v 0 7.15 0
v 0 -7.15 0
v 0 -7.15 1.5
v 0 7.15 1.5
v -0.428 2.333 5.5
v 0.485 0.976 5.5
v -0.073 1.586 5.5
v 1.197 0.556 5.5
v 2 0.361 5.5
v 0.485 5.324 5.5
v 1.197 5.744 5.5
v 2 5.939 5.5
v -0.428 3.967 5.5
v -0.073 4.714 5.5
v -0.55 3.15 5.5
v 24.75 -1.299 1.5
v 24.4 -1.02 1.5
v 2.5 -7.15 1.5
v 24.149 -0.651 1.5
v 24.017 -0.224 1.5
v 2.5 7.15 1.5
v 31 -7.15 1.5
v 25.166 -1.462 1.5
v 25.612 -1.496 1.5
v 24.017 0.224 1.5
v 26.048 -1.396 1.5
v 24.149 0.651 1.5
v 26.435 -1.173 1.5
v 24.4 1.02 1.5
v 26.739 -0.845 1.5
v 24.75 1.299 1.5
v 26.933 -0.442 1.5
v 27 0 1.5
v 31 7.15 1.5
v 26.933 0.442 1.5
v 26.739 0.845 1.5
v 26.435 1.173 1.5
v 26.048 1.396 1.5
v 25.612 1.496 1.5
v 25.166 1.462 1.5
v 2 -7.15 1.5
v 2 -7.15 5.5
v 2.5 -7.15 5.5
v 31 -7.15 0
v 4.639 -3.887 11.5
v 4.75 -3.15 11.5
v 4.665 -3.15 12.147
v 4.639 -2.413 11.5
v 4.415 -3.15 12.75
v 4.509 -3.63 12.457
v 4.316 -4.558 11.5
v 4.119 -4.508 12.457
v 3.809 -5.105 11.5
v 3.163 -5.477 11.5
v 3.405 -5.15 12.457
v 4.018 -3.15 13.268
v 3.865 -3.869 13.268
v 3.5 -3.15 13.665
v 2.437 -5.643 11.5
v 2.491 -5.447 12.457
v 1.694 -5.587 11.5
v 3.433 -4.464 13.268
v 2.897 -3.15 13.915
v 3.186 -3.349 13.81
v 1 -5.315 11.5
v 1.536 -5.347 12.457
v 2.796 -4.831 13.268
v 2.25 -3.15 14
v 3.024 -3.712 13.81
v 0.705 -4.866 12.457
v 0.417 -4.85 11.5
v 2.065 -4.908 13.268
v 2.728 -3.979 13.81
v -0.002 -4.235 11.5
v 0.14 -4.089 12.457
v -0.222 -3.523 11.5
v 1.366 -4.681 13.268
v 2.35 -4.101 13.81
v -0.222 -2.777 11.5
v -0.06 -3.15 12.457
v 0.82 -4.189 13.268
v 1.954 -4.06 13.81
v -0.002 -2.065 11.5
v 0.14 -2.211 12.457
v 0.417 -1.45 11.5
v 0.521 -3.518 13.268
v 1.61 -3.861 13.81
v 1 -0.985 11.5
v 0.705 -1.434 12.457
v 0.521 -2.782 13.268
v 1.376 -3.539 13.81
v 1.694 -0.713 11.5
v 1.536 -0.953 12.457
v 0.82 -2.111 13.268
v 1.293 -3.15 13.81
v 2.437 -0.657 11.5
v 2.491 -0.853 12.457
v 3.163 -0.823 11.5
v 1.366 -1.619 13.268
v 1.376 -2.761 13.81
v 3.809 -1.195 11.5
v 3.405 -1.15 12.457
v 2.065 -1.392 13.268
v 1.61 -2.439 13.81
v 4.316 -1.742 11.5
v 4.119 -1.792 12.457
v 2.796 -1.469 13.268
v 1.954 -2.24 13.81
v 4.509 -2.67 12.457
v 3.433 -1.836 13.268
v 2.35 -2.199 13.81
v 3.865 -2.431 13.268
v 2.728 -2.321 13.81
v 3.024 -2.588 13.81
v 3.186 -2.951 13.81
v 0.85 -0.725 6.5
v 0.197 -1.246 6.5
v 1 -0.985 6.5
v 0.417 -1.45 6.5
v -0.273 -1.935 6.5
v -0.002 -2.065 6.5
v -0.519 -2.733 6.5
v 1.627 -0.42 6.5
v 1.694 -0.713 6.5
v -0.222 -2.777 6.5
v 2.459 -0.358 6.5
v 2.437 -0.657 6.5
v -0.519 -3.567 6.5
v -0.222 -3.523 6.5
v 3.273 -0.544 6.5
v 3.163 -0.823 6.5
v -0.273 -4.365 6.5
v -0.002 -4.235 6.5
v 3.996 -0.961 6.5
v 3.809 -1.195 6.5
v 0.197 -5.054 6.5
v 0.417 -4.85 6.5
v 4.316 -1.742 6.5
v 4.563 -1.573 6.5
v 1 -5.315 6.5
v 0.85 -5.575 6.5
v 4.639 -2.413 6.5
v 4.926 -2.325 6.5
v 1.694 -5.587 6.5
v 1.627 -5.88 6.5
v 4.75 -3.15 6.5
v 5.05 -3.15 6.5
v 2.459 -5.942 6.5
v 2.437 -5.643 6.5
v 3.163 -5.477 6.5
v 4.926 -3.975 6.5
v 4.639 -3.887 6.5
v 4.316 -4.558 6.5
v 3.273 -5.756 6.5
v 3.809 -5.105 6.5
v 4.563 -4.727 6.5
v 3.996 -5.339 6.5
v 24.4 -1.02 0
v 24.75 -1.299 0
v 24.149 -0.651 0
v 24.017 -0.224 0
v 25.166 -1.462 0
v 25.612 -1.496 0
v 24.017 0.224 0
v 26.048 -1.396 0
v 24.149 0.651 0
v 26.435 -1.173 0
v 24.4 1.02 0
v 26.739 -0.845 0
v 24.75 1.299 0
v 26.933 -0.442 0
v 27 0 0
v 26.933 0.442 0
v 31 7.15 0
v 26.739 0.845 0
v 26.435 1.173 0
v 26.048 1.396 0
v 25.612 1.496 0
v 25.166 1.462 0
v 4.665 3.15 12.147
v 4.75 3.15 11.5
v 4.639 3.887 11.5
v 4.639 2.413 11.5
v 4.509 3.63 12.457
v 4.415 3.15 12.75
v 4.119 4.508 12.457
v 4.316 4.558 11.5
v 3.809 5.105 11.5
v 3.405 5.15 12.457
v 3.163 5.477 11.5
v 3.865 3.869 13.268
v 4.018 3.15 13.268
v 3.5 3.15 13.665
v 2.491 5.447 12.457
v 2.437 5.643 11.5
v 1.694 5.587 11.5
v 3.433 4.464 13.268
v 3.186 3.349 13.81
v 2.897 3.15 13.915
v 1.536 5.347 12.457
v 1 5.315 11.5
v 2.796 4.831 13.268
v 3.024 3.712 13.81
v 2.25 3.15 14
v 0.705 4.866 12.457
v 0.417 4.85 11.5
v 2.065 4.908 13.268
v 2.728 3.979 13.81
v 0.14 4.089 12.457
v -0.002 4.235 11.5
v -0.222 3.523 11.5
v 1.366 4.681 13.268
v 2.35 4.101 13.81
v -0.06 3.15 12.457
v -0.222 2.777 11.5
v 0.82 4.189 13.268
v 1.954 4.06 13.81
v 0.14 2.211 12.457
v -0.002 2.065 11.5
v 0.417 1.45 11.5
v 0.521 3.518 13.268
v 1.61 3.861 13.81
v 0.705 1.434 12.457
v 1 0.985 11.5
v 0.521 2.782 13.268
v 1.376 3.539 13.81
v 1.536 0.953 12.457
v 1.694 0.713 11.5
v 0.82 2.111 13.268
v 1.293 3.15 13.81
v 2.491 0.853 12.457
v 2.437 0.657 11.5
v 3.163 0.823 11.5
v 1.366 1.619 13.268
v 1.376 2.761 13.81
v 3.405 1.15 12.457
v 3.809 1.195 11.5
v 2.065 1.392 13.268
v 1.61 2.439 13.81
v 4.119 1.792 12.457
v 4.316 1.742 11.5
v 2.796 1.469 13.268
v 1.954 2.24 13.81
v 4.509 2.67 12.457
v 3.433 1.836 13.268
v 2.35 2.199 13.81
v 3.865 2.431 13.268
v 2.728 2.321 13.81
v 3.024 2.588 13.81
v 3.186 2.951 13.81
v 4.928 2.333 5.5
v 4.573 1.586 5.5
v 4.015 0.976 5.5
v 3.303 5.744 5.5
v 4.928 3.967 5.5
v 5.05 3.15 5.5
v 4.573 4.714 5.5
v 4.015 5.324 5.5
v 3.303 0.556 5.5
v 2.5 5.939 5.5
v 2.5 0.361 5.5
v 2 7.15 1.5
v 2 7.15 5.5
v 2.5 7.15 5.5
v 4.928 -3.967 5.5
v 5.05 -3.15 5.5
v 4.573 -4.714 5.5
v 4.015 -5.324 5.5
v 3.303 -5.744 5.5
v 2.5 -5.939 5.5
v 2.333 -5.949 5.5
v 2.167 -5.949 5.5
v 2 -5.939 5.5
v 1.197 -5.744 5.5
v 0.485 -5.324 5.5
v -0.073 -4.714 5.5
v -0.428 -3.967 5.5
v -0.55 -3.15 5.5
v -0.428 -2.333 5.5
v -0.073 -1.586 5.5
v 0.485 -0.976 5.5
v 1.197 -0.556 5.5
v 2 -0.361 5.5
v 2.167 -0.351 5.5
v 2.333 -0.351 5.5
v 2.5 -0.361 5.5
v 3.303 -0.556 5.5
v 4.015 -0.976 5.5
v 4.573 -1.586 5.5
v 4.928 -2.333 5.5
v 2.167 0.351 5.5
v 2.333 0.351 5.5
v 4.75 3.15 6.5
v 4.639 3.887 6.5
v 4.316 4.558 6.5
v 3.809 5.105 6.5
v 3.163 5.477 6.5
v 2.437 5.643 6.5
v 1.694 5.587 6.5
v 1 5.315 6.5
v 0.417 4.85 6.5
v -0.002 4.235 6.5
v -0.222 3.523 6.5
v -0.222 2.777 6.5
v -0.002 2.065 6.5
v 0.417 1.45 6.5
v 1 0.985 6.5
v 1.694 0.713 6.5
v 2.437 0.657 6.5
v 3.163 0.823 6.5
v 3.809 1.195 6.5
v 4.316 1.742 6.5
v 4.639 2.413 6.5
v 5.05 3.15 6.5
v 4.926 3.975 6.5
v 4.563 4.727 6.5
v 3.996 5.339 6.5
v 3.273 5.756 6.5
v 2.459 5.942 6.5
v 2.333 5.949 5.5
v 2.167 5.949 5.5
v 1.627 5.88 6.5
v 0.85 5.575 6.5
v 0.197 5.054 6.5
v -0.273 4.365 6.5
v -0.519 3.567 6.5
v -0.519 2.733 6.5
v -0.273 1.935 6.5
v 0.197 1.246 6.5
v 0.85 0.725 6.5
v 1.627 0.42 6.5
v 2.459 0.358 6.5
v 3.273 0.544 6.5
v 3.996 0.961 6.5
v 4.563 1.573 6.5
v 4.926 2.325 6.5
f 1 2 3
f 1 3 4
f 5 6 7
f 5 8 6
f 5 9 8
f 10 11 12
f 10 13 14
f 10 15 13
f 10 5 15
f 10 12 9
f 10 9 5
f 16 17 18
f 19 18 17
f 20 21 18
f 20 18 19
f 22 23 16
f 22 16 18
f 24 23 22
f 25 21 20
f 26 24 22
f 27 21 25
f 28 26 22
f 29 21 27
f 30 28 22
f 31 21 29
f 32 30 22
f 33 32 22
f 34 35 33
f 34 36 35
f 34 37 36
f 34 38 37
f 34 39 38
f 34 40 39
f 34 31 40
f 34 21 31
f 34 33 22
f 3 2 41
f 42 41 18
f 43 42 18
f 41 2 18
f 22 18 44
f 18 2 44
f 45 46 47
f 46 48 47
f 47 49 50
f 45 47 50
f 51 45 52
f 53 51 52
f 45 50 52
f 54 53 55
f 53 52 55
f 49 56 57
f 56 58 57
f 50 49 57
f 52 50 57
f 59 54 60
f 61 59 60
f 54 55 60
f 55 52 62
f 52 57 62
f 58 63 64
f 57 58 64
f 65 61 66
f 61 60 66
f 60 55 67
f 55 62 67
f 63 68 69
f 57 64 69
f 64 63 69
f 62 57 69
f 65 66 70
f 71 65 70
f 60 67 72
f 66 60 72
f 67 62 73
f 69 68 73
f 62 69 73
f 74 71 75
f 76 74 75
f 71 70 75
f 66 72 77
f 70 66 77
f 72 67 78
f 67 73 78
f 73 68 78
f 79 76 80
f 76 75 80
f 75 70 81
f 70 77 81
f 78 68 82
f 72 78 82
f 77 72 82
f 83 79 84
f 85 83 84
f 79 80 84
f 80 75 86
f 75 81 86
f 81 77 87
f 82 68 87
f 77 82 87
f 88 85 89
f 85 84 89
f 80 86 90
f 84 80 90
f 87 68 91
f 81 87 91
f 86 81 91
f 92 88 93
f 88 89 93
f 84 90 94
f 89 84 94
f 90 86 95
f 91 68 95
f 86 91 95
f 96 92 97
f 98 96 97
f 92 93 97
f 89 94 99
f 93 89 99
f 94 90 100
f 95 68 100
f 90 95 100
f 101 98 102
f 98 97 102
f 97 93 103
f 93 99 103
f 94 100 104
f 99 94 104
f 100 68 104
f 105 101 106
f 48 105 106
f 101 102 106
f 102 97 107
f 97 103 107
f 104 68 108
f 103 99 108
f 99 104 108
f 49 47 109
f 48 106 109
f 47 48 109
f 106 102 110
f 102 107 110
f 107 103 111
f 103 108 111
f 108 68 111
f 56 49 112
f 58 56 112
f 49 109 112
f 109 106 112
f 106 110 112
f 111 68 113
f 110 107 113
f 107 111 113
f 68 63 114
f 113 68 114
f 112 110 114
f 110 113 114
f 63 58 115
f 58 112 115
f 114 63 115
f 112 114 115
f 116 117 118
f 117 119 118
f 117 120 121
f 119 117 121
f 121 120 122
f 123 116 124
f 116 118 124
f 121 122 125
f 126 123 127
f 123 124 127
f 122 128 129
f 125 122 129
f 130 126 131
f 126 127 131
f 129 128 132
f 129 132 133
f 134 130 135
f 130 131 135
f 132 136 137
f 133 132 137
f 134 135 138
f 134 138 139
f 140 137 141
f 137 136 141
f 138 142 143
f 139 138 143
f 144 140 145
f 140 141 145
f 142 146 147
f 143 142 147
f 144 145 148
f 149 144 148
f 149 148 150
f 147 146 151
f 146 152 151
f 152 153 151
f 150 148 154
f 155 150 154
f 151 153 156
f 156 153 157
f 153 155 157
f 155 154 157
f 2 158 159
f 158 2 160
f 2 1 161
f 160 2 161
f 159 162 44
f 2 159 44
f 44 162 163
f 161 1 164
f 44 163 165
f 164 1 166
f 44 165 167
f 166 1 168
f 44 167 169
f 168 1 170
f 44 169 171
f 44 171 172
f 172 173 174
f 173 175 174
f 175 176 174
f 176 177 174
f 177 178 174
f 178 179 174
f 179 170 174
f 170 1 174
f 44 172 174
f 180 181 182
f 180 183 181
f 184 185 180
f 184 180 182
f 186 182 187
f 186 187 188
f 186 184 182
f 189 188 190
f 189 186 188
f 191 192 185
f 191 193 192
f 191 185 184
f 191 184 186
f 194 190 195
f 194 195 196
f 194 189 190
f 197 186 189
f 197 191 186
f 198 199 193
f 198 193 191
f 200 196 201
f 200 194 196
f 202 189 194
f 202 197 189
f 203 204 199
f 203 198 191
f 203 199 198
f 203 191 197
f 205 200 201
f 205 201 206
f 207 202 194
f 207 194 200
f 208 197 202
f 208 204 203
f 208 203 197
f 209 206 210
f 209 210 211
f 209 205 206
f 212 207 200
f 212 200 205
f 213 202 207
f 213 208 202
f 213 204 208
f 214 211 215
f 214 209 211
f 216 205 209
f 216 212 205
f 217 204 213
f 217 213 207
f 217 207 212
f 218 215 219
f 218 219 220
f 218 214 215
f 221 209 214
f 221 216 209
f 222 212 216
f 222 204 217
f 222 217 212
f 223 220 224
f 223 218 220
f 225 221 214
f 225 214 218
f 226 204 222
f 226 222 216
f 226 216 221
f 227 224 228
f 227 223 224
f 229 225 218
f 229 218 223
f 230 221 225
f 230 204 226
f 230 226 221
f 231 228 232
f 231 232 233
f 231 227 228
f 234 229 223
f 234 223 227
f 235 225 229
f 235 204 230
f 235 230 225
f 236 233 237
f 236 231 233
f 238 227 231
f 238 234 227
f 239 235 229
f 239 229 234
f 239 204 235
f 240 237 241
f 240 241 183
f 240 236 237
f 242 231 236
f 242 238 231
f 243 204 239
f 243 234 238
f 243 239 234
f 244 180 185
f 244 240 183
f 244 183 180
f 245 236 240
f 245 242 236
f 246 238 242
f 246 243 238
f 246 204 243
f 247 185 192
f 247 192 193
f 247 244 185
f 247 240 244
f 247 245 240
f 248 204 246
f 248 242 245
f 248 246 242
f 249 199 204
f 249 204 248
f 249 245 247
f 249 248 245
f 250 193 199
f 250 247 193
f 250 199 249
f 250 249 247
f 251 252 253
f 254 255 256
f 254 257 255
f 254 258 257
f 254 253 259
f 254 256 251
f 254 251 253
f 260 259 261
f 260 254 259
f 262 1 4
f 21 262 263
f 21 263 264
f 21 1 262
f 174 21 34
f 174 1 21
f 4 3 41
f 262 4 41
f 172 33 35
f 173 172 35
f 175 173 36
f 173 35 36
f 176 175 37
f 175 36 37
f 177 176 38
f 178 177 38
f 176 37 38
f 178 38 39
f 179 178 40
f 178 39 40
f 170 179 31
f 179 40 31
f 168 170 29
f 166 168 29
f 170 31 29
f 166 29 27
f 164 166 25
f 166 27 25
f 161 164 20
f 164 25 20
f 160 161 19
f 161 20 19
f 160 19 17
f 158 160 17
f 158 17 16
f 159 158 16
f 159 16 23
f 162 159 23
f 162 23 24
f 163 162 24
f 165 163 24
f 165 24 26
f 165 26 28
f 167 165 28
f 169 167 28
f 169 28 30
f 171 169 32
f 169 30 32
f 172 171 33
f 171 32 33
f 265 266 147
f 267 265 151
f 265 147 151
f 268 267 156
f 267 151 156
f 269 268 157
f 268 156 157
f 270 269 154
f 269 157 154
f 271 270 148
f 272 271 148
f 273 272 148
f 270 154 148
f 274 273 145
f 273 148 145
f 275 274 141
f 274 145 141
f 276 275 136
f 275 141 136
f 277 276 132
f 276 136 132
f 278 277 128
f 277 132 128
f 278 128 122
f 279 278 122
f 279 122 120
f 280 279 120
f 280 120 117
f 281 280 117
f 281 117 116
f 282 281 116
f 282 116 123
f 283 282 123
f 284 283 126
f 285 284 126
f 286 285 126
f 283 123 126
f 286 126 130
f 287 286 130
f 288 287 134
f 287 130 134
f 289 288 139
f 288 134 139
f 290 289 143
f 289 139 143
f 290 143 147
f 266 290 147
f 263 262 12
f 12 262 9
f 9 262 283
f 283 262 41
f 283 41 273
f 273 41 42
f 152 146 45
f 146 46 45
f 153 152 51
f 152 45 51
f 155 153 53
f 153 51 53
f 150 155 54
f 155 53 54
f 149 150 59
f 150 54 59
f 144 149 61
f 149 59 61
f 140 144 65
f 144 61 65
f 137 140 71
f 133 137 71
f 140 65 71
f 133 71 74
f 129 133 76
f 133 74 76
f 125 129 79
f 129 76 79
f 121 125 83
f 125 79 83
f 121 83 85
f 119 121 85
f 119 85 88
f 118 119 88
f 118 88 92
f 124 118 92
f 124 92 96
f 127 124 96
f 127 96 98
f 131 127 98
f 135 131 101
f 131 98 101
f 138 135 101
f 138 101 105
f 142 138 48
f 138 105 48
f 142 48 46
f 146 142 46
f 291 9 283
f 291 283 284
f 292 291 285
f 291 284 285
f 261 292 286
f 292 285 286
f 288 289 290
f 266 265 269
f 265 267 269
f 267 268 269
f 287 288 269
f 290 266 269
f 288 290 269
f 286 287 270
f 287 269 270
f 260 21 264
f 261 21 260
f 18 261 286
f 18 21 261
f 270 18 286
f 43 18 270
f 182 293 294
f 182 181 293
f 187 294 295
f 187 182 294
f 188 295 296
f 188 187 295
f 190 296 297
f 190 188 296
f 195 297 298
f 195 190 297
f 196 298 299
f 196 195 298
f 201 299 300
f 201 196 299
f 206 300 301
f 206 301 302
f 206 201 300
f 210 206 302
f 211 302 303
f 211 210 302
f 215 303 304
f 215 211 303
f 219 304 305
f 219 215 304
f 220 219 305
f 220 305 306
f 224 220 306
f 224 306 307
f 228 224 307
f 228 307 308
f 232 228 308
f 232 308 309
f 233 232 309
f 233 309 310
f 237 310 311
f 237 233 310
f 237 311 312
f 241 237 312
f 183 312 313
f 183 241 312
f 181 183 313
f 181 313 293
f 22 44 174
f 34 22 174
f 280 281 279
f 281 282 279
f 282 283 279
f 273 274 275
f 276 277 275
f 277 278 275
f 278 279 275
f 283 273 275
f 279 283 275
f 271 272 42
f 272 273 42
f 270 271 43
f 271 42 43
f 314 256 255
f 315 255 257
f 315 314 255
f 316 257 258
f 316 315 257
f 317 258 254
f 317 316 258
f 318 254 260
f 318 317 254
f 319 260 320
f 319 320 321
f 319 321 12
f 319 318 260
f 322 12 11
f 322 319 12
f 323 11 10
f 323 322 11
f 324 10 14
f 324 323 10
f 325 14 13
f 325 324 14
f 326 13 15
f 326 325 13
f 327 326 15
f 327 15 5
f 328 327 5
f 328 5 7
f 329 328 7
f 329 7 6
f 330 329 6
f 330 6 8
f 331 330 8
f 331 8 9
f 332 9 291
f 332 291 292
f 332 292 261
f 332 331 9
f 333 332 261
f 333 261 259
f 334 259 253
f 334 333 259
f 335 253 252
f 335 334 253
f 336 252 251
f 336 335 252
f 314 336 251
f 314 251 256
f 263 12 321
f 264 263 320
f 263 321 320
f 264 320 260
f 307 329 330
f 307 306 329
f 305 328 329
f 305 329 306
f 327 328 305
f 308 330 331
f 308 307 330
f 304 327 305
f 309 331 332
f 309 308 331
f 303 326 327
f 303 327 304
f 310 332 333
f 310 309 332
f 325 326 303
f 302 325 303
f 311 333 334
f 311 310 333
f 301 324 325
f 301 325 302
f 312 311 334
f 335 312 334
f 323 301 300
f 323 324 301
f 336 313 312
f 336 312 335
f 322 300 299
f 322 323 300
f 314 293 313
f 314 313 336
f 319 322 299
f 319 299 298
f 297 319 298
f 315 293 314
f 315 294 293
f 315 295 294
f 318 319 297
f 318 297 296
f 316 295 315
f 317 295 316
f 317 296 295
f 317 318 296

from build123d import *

# Parameters (mm, degrees)
SKETCH1_W           = 31
SKETCH1_H           = 14.3
BOSS_EXTRUDE1_DEPTH = 1.5
SKETCH2_W           = 0.5
SKETCH2_H           = 4
BOSS_EXTRUDE2_DEPTH = 14.3
SKETCH5_R           = 1.5
CUT_EXTRUDE1_DEPTH  = 1.5


with BuildPart() as part:
    # Sketch1 → Boss-Extrude1 (new body)
    with BuildSketch(Plane.XY):
        with Locations((15.5, 0)):
            Rectangle(SKETCH1_W, SKETCH1_H)
    extrude(amount=BOSS_EXTRUDE1_DEPTH)

    # Sketch2 → Boss-Extrude2 (add, through all)
    with BuildSketch(Plane.XZ.offset(7.15)):
        with Locations((2.25, 3.5)):
            Rectangle(SKETCH2_W, SKETCH2_H)
    extrude(amount=-BOSS_EXTRUDE2_DEPTH)

    # Sketch4 → Revolve1 (revolve)
    with BuildSketch(Plane.XZ.offset(3.15)):
        with BuildLine():
            Line((2.25, 14), (2.25, 5.5))
            Line((2.25, 5.5), (5.05, 5.5))
            Line((5.05, 5.5), (5.05, 6.5))
            Line((5.05, 6.5), (4.75, 6.5))
            Line((4.75, 6.5), (4.75, 11.499998492))
            ThreePointArc((4.75, 11.499998492), (4.017767486, 13.26776642), (2.25, 14))
        make_face()
    revolve1 = revolve(axis=Axis((2.25, -3.15, 14), (0, 0, -1)))

    # Mirror1: Revolve1 across plane
    add(revolve1.mirror(Plane.ZX))

    # Sketch5 → Cut-Extrude1 (cut)
    with BuildSketch(Plane.XY.offset(1.5)):
        with Locations((25.5, 0)):
            Circle(SKETCH5_R)
    extrude(amount=-CUT_EXTRUDE1_DEPTH, mode=Mode.SUBTRACT)


solid = part.part
